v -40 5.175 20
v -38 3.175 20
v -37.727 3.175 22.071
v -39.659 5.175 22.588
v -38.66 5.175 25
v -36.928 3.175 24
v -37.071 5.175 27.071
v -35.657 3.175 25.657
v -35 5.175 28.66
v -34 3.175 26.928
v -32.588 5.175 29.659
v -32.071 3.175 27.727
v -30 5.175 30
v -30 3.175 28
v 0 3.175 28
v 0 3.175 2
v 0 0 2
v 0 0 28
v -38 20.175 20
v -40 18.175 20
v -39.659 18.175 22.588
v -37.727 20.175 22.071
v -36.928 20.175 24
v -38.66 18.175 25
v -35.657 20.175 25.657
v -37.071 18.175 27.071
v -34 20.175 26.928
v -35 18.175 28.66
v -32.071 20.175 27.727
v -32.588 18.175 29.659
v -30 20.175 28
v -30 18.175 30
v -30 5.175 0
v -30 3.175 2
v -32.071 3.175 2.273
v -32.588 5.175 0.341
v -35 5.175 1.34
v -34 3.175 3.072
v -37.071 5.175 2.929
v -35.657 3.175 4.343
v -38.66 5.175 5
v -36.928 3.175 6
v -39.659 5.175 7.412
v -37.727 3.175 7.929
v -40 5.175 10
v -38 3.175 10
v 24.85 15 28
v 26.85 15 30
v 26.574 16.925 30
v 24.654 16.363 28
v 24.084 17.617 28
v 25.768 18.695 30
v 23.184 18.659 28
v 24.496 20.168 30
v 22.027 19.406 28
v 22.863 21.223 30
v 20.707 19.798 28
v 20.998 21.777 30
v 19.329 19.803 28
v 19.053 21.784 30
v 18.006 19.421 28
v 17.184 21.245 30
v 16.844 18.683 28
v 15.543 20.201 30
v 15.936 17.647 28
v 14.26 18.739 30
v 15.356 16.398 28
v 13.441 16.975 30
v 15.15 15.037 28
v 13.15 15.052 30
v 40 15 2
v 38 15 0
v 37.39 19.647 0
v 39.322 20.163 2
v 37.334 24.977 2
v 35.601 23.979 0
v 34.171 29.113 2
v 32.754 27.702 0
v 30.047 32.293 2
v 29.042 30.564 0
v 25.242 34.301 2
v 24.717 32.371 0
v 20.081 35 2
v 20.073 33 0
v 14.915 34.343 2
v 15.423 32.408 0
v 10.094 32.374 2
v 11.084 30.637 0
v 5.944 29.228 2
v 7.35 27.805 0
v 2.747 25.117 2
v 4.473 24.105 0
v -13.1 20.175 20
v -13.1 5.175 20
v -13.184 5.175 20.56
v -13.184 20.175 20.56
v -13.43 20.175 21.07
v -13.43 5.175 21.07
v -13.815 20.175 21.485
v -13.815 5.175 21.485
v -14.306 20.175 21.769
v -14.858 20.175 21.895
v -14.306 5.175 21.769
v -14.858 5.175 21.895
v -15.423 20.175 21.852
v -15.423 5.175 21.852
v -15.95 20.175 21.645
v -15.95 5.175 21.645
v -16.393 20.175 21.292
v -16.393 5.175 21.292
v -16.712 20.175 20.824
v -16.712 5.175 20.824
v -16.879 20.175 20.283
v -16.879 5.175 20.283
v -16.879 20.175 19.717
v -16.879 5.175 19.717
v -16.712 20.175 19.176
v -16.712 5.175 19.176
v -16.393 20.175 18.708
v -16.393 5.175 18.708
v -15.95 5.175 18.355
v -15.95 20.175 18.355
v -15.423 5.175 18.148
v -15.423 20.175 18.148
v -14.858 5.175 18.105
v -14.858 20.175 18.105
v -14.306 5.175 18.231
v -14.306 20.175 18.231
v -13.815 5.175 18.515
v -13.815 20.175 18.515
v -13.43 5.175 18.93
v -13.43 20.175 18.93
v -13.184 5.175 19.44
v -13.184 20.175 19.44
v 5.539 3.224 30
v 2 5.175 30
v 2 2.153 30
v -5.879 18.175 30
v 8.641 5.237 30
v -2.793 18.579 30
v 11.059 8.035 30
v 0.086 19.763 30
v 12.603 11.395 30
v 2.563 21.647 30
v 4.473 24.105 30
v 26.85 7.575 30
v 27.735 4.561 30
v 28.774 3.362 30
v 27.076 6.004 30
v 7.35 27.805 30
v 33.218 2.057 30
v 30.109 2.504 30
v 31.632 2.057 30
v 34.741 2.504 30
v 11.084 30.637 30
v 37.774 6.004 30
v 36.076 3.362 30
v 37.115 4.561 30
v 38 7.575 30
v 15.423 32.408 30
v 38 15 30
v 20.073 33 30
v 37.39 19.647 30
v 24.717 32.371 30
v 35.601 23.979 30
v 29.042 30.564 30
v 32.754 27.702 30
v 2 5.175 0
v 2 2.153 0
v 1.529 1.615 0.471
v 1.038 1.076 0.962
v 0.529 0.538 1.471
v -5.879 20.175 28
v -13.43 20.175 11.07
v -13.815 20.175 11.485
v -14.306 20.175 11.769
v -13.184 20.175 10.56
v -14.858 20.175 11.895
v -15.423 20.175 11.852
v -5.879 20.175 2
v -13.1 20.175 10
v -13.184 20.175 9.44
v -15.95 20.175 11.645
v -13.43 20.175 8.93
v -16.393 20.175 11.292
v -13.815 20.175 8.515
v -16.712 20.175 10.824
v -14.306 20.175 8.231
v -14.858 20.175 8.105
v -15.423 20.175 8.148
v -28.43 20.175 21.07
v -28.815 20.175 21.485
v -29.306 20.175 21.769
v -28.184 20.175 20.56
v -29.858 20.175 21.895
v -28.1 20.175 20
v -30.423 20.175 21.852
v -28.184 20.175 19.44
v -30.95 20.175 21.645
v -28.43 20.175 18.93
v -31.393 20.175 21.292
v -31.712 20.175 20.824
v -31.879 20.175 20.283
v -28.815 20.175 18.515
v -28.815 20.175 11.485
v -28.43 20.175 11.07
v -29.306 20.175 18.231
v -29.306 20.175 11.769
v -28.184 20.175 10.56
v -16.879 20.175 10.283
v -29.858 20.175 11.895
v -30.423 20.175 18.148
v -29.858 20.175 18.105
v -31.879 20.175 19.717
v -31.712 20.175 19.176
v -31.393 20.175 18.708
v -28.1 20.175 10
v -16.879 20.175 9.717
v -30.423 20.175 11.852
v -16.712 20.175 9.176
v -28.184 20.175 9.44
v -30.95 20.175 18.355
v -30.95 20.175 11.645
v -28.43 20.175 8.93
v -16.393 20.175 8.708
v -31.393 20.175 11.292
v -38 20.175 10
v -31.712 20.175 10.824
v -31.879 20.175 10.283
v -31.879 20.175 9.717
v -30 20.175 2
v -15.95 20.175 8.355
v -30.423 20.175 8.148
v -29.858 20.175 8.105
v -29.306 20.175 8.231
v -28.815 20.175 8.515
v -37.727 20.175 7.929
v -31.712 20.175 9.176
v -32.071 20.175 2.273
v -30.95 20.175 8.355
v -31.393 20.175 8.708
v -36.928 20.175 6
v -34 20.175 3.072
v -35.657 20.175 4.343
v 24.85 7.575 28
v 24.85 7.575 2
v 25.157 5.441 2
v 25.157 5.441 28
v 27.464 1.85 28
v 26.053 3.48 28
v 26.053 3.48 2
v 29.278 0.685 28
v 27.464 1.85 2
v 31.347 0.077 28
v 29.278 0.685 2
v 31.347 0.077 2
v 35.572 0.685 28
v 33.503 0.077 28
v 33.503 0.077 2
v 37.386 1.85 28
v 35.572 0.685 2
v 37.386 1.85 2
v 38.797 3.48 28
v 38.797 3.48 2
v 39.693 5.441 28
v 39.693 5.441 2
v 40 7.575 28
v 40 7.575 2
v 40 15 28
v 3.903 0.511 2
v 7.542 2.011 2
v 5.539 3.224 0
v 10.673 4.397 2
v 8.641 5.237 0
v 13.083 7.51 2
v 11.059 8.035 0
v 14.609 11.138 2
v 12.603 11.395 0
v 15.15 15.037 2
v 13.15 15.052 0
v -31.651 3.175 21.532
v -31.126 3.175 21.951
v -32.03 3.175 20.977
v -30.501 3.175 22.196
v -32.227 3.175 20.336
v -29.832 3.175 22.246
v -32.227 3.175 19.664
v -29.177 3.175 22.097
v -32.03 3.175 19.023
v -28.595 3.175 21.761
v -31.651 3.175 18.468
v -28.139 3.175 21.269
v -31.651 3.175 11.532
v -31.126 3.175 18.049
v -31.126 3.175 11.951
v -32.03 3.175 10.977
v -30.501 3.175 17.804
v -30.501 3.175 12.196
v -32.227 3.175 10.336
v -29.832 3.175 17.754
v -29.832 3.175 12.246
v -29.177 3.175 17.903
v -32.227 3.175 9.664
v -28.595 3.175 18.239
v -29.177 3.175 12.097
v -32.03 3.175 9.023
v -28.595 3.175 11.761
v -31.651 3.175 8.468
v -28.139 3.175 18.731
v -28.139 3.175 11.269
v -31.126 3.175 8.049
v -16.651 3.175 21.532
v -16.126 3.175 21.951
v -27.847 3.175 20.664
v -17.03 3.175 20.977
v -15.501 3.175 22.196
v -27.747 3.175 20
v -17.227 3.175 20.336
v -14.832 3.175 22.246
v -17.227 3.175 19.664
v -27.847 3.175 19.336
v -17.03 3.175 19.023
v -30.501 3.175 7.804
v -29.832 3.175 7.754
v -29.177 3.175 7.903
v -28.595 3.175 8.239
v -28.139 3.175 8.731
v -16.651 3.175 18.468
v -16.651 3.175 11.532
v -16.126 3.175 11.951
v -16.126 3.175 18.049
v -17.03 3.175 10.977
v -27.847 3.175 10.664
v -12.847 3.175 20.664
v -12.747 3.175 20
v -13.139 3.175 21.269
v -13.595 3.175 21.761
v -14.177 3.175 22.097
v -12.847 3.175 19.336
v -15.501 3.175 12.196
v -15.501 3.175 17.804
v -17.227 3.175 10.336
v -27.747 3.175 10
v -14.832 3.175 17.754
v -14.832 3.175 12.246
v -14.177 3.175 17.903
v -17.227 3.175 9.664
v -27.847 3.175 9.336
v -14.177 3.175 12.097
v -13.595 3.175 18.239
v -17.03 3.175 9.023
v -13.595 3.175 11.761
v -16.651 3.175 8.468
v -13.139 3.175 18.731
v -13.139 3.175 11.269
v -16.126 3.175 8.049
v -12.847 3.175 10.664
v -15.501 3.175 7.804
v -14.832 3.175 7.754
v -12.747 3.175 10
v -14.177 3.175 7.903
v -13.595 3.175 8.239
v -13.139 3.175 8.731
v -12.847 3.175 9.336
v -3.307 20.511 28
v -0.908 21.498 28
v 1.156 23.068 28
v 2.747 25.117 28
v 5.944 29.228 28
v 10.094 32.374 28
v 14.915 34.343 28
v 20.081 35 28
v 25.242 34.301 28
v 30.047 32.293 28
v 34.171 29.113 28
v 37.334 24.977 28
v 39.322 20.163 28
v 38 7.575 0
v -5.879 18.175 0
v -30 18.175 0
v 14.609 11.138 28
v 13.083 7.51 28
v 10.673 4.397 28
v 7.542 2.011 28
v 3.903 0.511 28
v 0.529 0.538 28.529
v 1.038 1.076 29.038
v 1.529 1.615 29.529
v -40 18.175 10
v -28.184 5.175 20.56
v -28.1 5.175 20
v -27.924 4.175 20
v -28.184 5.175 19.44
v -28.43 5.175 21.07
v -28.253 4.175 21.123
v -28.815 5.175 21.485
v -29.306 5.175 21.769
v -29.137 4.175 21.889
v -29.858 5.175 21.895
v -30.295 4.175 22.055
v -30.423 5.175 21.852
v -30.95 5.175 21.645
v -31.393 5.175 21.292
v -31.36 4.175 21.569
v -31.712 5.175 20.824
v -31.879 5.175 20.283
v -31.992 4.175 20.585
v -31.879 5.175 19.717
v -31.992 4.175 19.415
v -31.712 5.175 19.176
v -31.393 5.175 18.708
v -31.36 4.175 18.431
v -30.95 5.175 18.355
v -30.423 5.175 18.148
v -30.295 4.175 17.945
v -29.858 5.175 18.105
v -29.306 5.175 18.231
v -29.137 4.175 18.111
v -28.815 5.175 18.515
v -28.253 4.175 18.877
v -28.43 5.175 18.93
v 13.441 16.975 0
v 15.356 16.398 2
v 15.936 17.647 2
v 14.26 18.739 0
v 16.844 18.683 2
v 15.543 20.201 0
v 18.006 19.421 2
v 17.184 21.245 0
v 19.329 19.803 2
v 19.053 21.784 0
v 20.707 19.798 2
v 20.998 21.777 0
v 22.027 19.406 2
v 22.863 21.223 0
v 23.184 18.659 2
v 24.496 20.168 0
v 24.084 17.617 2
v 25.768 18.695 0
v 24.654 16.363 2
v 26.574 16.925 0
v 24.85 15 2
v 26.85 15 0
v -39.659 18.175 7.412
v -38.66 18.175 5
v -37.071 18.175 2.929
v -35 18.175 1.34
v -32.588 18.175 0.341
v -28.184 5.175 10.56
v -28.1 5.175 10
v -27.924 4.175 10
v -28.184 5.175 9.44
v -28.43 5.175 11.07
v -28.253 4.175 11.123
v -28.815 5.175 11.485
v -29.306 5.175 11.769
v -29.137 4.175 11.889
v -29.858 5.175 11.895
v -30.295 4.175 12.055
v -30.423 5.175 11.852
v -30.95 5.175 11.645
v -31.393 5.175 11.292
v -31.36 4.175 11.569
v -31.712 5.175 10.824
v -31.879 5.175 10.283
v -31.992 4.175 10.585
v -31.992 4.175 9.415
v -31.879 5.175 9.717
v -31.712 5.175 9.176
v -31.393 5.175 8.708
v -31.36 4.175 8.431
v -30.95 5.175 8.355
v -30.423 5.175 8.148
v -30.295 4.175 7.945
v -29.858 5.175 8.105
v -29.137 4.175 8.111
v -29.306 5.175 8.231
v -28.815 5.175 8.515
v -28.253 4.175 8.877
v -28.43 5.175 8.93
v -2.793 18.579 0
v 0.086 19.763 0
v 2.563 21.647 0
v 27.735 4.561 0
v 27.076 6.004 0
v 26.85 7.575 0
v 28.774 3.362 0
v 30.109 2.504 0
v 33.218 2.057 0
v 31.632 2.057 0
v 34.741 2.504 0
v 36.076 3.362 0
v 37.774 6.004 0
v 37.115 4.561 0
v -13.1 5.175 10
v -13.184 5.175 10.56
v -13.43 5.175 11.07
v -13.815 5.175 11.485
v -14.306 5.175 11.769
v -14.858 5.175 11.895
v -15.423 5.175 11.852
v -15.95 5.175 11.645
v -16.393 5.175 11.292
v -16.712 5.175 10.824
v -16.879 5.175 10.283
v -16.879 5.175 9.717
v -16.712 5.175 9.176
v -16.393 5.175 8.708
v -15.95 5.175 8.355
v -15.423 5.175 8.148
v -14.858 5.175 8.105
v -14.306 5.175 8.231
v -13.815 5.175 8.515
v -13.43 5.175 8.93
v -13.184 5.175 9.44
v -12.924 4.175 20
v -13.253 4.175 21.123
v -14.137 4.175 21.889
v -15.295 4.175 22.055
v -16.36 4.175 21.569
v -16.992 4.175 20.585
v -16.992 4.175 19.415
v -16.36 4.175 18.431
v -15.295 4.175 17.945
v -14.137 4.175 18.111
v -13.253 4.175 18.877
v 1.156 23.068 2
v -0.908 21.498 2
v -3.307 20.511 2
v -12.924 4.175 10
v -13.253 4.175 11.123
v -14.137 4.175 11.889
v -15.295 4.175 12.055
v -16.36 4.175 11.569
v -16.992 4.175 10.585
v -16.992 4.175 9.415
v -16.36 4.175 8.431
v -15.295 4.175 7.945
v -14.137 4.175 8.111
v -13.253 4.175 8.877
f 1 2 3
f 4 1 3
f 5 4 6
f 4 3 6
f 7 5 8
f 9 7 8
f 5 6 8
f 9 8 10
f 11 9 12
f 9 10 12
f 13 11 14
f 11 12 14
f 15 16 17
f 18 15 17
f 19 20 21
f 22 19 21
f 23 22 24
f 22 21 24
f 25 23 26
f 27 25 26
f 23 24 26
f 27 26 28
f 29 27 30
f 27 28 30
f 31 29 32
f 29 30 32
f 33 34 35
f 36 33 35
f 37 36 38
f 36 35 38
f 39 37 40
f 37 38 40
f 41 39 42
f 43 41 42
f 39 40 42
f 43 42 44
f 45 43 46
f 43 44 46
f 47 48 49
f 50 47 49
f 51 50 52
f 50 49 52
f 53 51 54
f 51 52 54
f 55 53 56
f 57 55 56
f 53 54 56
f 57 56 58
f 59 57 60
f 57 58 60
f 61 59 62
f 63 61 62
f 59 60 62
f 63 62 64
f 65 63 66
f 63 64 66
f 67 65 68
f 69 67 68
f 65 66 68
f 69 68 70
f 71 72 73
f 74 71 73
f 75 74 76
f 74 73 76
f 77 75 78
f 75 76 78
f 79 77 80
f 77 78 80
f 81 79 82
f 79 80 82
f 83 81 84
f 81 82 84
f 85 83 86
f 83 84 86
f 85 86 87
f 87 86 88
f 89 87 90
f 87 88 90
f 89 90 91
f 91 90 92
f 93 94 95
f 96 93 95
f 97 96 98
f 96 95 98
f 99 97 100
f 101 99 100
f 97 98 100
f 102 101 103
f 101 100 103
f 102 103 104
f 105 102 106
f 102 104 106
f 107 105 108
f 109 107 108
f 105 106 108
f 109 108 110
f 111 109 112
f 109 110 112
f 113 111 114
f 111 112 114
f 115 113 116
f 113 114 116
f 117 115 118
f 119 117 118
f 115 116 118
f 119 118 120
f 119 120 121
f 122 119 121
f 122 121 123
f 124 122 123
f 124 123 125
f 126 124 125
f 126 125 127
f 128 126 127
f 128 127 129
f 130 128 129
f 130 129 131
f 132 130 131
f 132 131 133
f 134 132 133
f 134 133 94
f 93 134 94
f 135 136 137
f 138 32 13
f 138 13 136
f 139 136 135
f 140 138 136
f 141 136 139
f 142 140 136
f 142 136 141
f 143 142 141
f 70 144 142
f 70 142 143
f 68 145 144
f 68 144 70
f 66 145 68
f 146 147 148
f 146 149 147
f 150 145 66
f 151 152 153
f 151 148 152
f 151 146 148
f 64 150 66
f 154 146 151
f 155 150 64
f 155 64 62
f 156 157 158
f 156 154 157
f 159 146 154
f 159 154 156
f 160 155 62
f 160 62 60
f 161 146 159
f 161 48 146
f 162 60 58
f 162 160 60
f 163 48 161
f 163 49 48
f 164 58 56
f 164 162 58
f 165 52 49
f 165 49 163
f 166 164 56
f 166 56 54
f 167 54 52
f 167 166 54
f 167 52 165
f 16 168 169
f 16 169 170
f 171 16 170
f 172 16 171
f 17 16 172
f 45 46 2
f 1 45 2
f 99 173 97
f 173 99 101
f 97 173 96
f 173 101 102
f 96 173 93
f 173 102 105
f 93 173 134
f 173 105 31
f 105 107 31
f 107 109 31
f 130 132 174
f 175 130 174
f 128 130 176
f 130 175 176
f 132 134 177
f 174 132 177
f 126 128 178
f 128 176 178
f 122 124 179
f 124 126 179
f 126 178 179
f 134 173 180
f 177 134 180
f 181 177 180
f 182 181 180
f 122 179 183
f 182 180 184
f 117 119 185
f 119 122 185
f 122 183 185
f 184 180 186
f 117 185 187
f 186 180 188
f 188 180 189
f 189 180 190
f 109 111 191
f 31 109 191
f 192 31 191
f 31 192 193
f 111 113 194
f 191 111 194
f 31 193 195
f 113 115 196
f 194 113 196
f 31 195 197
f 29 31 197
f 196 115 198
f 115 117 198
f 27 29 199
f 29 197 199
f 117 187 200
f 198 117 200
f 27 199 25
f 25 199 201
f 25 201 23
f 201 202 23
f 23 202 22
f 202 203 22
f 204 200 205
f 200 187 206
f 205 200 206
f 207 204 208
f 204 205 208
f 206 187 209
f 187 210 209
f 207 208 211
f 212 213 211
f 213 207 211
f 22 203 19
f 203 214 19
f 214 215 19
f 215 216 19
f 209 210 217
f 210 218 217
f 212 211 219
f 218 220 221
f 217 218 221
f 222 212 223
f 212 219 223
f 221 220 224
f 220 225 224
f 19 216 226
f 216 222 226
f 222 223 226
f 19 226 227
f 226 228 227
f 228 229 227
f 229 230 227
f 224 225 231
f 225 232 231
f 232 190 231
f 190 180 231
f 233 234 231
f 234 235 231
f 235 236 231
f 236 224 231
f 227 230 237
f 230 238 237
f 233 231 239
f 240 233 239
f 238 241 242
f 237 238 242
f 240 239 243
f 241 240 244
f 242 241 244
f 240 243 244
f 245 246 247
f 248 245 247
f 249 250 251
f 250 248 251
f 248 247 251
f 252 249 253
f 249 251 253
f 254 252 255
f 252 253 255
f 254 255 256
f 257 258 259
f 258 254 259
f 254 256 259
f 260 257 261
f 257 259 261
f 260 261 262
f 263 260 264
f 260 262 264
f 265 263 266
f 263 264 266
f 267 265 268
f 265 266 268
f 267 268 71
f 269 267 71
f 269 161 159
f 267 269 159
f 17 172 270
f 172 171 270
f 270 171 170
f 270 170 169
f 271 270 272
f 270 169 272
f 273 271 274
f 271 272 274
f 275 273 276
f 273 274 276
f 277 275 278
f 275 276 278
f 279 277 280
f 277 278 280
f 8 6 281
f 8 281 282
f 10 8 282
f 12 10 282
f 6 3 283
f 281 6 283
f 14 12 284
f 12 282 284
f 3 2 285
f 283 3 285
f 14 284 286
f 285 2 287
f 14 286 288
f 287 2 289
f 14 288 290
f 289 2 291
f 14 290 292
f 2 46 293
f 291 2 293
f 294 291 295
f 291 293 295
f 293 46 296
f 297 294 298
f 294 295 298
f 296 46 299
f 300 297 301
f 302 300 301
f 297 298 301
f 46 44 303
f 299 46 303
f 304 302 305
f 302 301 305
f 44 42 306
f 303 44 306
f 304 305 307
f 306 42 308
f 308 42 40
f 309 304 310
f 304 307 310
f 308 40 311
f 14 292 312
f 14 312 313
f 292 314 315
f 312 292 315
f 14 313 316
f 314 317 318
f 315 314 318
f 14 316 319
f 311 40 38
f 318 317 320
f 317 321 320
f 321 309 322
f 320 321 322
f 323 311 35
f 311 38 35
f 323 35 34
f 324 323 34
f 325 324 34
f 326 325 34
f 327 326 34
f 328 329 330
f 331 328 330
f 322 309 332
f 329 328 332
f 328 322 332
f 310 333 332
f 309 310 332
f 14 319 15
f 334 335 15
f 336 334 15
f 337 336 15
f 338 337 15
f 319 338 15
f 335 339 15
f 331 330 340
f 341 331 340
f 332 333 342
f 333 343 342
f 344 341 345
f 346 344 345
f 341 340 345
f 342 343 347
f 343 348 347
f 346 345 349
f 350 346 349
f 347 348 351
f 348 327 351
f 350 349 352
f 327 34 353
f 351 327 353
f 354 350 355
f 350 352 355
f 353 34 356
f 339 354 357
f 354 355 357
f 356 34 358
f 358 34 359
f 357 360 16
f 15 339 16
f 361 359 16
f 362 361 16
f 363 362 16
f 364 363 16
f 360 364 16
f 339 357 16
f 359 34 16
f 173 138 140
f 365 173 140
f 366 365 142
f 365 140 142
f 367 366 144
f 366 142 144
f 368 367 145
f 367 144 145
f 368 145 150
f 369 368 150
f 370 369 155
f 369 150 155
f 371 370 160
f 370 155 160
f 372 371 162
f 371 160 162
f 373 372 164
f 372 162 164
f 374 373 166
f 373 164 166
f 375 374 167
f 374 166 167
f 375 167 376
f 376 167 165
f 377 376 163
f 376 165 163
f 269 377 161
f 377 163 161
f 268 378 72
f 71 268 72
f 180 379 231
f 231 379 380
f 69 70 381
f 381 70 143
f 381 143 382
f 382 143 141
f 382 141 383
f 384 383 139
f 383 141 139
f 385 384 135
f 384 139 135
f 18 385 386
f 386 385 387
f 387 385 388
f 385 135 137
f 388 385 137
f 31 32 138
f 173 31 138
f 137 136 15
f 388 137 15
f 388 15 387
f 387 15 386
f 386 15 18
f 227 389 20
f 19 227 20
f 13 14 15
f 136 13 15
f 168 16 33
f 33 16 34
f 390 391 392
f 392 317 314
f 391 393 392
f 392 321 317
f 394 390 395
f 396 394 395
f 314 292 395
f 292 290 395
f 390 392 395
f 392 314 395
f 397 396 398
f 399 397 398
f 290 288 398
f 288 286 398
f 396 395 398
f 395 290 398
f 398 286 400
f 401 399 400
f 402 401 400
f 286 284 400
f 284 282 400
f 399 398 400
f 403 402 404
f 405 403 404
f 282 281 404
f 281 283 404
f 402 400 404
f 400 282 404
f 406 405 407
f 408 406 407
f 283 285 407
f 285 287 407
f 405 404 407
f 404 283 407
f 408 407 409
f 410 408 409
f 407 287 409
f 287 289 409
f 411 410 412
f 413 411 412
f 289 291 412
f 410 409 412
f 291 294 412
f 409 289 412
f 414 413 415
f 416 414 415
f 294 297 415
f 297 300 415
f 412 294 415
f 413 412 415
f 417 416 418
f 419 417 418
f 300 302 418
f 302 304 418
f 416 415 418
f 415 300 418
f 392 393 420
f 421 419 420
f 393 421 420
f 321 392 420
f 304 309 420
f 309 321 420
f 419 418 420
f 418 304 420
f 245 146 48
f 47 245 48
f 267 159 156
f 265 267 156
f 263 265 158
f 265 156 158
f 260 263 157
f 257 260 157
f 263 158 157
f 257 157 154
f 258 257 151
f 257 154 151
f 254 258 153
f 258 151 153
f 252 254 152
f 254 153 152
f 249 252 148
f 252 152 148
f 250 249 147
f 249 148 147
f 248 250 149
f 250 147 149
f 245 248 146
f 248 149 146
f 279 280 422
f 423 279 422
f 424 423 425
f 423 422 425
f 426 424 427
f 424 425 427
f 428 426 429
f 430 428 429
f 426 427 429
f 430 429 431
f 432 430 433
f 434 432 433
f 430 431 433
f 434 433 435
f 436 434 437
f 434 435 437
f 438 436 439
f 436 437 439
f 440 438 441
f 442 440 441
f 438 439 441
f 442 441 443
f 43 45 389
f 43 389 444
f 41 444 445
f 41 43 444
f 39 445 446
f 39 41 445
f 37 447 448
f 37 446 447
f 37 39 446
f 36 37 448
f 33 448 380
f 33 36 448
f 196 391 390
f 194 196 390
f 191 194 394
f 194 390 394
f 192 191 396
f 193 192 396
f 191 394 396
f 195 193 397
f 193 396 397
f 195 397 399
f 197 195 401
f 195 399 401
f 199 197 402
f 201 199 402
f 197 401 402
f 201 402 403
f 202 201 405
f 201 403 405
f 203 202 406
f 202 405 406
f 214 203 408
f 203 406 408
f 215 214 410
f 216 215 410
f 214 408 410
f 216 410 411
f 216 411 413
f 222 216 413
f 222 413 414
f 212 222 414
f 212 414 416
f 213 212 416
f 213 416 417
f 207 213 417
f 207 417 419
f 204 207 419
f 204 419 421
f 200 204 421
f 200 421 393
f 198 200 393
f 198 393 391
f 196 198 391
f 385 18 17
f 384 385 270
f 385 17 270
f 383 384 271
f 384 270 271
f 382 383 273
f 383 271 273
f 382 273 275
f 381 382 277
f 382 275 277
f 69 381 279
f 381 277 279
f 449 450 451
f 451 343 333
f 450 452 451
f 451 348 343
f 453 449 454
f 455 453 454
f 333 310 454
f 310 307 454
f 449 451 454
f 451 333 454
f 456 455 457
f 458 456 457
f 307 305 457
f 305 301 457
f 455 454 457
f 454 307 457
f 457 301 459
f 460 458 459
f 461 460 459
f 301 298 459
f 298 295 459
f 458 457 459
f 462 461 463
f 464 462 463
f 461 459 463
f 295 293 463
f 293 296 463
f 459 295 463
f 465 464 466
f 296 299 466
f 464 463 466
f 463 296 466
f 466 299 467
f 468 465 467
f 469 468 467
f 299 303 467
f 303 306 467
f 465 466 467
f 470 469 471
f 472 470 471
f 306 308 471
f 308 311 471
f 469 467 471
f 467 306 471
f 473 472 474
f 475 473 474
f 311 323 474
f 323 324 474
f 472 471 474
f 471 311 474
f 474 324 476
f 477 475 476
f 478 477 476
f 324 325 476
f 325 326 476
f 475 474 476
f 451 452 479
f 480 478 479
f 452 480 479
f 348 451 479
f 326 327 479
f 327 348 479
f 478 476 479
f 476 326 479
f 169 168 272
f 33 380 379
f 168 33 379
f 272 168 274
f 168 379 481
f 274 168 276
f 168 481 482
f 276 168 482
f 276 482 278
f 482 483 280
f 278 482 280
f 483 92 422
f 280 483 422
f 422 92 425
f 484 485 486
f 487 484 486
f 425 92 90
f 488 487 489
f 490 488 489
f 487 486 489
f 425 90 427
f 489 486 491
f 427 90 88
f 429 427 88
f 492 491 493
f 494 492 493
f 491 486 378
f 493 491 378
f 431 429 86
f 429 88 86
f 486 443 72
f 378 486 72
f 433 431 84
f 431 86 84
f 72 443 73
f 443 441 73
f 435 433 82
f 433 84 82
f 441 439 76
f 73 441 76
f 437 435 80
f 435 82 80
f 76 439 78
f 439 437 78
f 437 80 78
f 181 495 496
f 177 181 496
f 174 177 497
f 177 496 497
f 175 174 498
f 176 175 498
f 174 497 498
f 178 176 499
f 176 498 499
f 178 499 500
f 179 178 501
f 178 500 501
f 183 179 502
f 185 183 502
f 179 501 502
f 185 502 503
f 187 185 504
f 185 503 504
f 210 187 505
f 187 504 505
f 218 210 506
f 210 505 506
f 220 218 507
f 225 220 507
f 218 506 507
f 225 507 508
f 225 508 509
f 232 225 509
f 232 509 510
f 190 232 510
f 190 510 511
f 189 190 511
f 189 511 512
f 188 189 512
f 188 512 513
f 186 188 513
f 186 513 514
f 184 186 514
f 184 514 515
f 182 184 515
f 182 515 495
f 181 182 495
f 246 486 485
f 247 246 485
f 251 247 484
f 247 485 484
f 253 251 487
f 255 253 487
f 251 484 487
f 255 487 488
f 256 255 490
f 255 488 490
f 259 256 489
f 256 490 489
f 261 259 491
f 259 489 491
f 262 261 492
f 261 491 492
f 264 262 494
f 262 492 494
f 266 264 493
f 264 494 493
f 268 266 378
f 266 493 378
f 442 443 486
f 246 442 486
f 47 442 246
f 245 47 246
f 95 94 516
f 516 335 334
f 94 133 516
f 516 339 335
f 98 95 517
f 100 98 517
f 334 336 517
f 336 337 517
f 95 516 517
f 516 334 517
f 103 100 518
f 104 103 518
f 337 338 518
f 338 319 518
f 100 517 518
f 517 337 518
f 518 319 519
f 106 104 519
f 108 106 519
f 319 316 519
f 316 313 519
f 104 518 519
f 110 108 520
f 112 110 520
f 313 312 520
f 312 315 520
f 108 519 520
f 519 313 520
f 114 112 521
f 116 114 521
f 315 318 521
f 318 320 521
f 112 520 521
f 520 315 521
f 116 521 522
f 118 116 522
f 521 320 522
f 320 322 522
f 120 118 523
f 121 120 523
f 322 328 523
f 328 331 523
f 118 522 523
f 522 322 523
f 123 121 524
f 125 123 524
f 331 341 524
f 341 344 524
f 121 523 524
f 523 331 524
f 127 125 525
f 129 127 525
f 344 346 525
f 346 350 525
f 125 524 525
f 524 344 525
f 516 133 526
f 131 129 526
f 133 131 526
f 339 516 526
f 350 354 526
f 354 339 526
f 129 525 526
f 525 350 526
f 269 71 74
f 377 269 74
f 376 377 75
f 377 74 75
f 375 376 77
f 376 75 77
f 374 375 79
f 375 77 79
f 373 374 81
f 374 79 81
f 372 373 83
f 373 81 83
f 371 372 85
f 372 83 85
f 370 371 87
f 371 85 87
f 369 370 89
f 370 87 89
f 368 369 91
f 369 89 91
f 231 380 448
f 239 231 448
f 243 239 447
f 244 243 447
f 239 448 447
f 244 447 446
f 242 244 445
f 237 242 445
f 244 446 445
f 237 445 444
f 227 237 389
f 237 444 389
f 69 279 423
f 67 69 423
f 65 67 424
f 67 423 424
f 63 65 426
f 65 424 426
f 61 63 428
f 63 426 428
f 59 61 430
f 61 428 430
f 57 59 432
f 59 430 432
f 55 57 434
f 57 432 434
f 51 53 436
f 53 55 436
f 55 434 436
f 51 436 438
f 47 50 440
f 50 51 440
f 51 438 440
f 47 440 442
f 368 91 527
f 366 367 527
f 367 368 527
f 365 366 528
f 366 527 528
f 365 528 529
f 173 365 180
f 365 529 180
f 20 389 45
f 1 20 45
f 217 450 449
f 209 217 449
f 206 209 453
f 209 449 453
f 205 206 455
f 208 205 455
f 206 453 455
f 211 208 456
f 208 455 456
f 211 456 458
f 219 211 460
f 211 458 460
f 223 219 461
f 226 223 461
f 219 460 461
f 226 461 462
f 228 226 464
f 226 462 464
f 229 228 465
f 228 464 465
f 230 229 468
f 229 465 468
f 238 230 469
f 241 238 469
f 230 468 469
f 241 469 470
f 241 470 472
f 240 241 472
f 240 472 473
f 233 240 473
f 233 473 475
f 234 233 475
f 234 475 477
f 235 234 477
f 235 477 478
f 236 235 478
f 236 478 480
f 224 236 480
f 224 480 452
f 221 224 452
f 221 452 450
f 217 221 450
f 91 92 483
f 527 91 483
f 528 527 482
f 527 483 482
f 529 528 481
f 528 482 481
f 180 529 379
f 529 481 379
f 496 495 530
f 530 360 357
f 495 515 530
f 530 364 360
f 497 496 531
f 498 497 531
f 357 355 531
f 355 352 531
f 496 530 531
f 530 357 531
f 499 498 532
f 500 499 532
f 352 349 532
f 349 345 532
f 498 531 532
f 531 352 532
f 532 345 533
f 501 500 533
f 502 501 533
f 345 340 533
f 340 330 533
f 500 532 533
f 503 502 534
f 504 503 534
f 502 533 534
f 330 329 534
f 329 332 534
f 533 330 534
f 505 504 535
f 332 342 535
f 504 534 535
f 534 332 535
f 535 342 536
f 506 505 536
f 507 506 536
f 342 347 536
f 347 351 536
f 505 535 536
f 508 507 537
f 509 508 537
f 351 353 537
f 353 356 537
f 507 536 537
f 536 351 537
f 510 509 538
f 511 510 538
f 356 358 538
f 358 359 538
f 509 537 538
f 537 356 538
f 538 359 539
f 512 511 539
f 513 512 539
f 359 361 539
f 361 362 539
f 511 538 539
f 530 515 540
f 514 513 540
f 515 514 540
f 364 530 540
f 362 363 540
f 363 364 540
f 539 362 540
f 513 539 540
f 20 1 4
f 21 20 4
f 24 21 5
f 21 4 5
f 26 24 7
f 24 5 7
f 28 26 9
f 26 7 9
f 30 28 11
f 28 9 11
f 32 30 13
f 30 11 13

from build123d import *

# Parameters (mm, degrees)
BOSS_EXTRUDE1_DEPTH   = 30
FILLET1_R             = 10
CHAMFER1_SIZE         = 2
SKETCH3_R             = 1.9
CUT_EXTRUDE1_DEPTH    = 32.825
CHAMFER2_SIZE         = 2
CHAMFER2_SIZE2        = 0.352653961
CHAMFER2_PART_2_SIZE  = 2
CHAMFER2_PART_2_SIZE2 = 0.352653961
CHAMFER2_PART_3_SIZE  = 2
CHAMFER2_PART_3_SIZE2 = 0.352653961
CHAMFER2_PART_4_SIZE  = 2
CHAMFER2_PART_4_SIZE2 = 0.352653961


with BuildPart() as part:
    # Sketch1 → Boss-Extrude1 (new body)
    with BuildSketch(Plane.XY):
        with BuildLine():
            Line((0, 3.175), (0, 0))
            ThreePointArc((0, 0), (10.672667654, 4.397249215), (15.150137433, 15.036511402))
            ThreePointArc((15.150137433, 15.036511402), (20.018255831, 19.849965642), (24.85, 15))
            Line((24.85, 15), (24.85, 7.575))
            ThreePointArc((24.85, 7.575), (32.425, 0), (40, 7.575))
            Line((40, 7.575), (40, 15))
            ThreePointArc((40, 15), (25.241541186, 34.300938992), (2.747375401, 25.116666667))
            ThreePointArc((2.747375401, 25.116666667), (-0.908189135, 21.497922919), (-5.878936899, 20.175))
            Line((-5.878936899, 20.175), (-40, 20.175))
            Line((-40, 20.175), (-40, 3.175))
            Line((-40, 3.175), (0, 3.175))
        make_face()
    extrude(amount=BOSS_EXTRUDE1_DEPTH)

    # Fillet1
    fillet1_edges = [part.edges().sort_by_distance(p)[0] for p in [
        (-40, 11.675, 0),
        (-40, 11.675, 30),
    ]]
    fillet(fillet1_edges, radius=FILLET1_R)

    # Chamfer1
    chamfer1_edges = [part.edges().sort_by_distance(p)[0] for p in [
        (-17.939468449, 20.175, 0),
        (-0.908189135, 21.497922919, 0),
        (25.241541186, 34.300938992, 0),
        (40, 11.2875, 0),
        (10.672667654, 4.397249215, 30),
        (32.425, 0, 0),
        (24.85, 11.2875, 0),
        (20.018255831, 19.849965642, 0),
        (10.672667654, 4.397249215, 0),
        (0, 1.5875, 0),
        (20.018255831, 19.849965642, 30),
        (24.85, 11.2875, 30),
        (32.425, 0, 30),
        (40, 11.2875, 30),
        (25.241541186, 34.300938992, 30),
        (-40, 3.175, 15),
        (-40, 20.175, 15),
        (-15, 3.175, 0),
        (-15, 3.175, 30),
        (-37.071067812, 3.175, 27.071067812),
        (-0.908189135, 21.497922919, 30),
        (-37.071067812, 3.175, 2.928932188),
        (-37.071067812, 20.175, 27.071067812),
        (-37.071067812, 20.175, 2.928932188),
        (-17.939468449, 20.175, 30),
        (0, 1.5875, 30),
    ]]
    chamfer(chamfer1_edges, length=CHAMFER1_SIZE)

    # Sketch3 → Cut-Extrude1 (cut, through all)
    with BuildSketch(Plane.XZ.offset(-3.175)):
        with Locations((-30, 20)):
            Circle(SKETCH3_R)
        with Locations((-15, 20)):
            Circle(SKETCH3_R)
        with Locations((-15, 10)):
            Circle(SKETCH3_R)
        with Locations((-30, 10)):
            Circle(SKETCH3_R)
    extrude(amount=-CUT_EXTRUDE1_DEPTH, mode=Mode.SUBTRACT)

    # Chamfer2
    chamfer2_edges = [part.edges().sort_by_distance(p)[0] for p in [
        (-31.9, 3.175, 10),
    ]]
    chamfer2_side = [part.faces().sort_by_distance(p)[0] for p in [
        (-31.9, 11.675, 10),
    ]]
    chamfer(chamfer2_edges, length=CHAMFER2_SIZE, length2=CHAMFER2_SIZE2, reference=chamfer2_side[0])

    # Chamfer2 part 2
    chamfer2_part_2_edges = [part.edges().sort_by_distance(p)[0] for p in [
        (-16.9, 3.175, 10),
    ]]
    chamfer2_part_2_side = [part.faces().sort_by_distance(p)[0] for p in [
        (-16.9, 11.675, 10),
    ]]
    chamfer(chamfer2_part_2_edges, length=CHAMFER2_PART_2_SIZE, length2=CHAMFER2_PART_2_SIZE2, reference=chamfer2_part_2_side[0])

    # Chamfer2 part 3
    chamfer2_part_3_edges = [part.edges().sort_by_distance(p)[0] for p in [
        (-16.9, 3.175, 20),
    ]]
    chamfer2_part_3_side = [part.faces().sort_by_distance(p)[0] for p in [
        (-16.9, 11.675, 20),
    ]]
    chamfer(chamfer2_part_3_edges, length=CHAMFER2_PART_3_SIZE, length2=CHAMFER2_PART_3_SIZE2, reference=chamfer2_part_3_side[0])

    # Chamfer2 part 4
    chamfer2_part_4_edges = [part.edges().sort_by_distance(p)[0] for p in [
        (-31.9, 3.175, 20),
    ]]
    chamfer2_part_4_side = [part.faces().sort_by_distance(p)[0] for p in [
        (-31.9, 11.675, 20),
    ]]
    chamfer(chamfer2_part_4_edges, length=CHAMFER2_PART_4_SIZE, length2=CHAMFER2_PART_4_SIZE2, reference=chamfer2_part_4_side[0])


solid = part.part
